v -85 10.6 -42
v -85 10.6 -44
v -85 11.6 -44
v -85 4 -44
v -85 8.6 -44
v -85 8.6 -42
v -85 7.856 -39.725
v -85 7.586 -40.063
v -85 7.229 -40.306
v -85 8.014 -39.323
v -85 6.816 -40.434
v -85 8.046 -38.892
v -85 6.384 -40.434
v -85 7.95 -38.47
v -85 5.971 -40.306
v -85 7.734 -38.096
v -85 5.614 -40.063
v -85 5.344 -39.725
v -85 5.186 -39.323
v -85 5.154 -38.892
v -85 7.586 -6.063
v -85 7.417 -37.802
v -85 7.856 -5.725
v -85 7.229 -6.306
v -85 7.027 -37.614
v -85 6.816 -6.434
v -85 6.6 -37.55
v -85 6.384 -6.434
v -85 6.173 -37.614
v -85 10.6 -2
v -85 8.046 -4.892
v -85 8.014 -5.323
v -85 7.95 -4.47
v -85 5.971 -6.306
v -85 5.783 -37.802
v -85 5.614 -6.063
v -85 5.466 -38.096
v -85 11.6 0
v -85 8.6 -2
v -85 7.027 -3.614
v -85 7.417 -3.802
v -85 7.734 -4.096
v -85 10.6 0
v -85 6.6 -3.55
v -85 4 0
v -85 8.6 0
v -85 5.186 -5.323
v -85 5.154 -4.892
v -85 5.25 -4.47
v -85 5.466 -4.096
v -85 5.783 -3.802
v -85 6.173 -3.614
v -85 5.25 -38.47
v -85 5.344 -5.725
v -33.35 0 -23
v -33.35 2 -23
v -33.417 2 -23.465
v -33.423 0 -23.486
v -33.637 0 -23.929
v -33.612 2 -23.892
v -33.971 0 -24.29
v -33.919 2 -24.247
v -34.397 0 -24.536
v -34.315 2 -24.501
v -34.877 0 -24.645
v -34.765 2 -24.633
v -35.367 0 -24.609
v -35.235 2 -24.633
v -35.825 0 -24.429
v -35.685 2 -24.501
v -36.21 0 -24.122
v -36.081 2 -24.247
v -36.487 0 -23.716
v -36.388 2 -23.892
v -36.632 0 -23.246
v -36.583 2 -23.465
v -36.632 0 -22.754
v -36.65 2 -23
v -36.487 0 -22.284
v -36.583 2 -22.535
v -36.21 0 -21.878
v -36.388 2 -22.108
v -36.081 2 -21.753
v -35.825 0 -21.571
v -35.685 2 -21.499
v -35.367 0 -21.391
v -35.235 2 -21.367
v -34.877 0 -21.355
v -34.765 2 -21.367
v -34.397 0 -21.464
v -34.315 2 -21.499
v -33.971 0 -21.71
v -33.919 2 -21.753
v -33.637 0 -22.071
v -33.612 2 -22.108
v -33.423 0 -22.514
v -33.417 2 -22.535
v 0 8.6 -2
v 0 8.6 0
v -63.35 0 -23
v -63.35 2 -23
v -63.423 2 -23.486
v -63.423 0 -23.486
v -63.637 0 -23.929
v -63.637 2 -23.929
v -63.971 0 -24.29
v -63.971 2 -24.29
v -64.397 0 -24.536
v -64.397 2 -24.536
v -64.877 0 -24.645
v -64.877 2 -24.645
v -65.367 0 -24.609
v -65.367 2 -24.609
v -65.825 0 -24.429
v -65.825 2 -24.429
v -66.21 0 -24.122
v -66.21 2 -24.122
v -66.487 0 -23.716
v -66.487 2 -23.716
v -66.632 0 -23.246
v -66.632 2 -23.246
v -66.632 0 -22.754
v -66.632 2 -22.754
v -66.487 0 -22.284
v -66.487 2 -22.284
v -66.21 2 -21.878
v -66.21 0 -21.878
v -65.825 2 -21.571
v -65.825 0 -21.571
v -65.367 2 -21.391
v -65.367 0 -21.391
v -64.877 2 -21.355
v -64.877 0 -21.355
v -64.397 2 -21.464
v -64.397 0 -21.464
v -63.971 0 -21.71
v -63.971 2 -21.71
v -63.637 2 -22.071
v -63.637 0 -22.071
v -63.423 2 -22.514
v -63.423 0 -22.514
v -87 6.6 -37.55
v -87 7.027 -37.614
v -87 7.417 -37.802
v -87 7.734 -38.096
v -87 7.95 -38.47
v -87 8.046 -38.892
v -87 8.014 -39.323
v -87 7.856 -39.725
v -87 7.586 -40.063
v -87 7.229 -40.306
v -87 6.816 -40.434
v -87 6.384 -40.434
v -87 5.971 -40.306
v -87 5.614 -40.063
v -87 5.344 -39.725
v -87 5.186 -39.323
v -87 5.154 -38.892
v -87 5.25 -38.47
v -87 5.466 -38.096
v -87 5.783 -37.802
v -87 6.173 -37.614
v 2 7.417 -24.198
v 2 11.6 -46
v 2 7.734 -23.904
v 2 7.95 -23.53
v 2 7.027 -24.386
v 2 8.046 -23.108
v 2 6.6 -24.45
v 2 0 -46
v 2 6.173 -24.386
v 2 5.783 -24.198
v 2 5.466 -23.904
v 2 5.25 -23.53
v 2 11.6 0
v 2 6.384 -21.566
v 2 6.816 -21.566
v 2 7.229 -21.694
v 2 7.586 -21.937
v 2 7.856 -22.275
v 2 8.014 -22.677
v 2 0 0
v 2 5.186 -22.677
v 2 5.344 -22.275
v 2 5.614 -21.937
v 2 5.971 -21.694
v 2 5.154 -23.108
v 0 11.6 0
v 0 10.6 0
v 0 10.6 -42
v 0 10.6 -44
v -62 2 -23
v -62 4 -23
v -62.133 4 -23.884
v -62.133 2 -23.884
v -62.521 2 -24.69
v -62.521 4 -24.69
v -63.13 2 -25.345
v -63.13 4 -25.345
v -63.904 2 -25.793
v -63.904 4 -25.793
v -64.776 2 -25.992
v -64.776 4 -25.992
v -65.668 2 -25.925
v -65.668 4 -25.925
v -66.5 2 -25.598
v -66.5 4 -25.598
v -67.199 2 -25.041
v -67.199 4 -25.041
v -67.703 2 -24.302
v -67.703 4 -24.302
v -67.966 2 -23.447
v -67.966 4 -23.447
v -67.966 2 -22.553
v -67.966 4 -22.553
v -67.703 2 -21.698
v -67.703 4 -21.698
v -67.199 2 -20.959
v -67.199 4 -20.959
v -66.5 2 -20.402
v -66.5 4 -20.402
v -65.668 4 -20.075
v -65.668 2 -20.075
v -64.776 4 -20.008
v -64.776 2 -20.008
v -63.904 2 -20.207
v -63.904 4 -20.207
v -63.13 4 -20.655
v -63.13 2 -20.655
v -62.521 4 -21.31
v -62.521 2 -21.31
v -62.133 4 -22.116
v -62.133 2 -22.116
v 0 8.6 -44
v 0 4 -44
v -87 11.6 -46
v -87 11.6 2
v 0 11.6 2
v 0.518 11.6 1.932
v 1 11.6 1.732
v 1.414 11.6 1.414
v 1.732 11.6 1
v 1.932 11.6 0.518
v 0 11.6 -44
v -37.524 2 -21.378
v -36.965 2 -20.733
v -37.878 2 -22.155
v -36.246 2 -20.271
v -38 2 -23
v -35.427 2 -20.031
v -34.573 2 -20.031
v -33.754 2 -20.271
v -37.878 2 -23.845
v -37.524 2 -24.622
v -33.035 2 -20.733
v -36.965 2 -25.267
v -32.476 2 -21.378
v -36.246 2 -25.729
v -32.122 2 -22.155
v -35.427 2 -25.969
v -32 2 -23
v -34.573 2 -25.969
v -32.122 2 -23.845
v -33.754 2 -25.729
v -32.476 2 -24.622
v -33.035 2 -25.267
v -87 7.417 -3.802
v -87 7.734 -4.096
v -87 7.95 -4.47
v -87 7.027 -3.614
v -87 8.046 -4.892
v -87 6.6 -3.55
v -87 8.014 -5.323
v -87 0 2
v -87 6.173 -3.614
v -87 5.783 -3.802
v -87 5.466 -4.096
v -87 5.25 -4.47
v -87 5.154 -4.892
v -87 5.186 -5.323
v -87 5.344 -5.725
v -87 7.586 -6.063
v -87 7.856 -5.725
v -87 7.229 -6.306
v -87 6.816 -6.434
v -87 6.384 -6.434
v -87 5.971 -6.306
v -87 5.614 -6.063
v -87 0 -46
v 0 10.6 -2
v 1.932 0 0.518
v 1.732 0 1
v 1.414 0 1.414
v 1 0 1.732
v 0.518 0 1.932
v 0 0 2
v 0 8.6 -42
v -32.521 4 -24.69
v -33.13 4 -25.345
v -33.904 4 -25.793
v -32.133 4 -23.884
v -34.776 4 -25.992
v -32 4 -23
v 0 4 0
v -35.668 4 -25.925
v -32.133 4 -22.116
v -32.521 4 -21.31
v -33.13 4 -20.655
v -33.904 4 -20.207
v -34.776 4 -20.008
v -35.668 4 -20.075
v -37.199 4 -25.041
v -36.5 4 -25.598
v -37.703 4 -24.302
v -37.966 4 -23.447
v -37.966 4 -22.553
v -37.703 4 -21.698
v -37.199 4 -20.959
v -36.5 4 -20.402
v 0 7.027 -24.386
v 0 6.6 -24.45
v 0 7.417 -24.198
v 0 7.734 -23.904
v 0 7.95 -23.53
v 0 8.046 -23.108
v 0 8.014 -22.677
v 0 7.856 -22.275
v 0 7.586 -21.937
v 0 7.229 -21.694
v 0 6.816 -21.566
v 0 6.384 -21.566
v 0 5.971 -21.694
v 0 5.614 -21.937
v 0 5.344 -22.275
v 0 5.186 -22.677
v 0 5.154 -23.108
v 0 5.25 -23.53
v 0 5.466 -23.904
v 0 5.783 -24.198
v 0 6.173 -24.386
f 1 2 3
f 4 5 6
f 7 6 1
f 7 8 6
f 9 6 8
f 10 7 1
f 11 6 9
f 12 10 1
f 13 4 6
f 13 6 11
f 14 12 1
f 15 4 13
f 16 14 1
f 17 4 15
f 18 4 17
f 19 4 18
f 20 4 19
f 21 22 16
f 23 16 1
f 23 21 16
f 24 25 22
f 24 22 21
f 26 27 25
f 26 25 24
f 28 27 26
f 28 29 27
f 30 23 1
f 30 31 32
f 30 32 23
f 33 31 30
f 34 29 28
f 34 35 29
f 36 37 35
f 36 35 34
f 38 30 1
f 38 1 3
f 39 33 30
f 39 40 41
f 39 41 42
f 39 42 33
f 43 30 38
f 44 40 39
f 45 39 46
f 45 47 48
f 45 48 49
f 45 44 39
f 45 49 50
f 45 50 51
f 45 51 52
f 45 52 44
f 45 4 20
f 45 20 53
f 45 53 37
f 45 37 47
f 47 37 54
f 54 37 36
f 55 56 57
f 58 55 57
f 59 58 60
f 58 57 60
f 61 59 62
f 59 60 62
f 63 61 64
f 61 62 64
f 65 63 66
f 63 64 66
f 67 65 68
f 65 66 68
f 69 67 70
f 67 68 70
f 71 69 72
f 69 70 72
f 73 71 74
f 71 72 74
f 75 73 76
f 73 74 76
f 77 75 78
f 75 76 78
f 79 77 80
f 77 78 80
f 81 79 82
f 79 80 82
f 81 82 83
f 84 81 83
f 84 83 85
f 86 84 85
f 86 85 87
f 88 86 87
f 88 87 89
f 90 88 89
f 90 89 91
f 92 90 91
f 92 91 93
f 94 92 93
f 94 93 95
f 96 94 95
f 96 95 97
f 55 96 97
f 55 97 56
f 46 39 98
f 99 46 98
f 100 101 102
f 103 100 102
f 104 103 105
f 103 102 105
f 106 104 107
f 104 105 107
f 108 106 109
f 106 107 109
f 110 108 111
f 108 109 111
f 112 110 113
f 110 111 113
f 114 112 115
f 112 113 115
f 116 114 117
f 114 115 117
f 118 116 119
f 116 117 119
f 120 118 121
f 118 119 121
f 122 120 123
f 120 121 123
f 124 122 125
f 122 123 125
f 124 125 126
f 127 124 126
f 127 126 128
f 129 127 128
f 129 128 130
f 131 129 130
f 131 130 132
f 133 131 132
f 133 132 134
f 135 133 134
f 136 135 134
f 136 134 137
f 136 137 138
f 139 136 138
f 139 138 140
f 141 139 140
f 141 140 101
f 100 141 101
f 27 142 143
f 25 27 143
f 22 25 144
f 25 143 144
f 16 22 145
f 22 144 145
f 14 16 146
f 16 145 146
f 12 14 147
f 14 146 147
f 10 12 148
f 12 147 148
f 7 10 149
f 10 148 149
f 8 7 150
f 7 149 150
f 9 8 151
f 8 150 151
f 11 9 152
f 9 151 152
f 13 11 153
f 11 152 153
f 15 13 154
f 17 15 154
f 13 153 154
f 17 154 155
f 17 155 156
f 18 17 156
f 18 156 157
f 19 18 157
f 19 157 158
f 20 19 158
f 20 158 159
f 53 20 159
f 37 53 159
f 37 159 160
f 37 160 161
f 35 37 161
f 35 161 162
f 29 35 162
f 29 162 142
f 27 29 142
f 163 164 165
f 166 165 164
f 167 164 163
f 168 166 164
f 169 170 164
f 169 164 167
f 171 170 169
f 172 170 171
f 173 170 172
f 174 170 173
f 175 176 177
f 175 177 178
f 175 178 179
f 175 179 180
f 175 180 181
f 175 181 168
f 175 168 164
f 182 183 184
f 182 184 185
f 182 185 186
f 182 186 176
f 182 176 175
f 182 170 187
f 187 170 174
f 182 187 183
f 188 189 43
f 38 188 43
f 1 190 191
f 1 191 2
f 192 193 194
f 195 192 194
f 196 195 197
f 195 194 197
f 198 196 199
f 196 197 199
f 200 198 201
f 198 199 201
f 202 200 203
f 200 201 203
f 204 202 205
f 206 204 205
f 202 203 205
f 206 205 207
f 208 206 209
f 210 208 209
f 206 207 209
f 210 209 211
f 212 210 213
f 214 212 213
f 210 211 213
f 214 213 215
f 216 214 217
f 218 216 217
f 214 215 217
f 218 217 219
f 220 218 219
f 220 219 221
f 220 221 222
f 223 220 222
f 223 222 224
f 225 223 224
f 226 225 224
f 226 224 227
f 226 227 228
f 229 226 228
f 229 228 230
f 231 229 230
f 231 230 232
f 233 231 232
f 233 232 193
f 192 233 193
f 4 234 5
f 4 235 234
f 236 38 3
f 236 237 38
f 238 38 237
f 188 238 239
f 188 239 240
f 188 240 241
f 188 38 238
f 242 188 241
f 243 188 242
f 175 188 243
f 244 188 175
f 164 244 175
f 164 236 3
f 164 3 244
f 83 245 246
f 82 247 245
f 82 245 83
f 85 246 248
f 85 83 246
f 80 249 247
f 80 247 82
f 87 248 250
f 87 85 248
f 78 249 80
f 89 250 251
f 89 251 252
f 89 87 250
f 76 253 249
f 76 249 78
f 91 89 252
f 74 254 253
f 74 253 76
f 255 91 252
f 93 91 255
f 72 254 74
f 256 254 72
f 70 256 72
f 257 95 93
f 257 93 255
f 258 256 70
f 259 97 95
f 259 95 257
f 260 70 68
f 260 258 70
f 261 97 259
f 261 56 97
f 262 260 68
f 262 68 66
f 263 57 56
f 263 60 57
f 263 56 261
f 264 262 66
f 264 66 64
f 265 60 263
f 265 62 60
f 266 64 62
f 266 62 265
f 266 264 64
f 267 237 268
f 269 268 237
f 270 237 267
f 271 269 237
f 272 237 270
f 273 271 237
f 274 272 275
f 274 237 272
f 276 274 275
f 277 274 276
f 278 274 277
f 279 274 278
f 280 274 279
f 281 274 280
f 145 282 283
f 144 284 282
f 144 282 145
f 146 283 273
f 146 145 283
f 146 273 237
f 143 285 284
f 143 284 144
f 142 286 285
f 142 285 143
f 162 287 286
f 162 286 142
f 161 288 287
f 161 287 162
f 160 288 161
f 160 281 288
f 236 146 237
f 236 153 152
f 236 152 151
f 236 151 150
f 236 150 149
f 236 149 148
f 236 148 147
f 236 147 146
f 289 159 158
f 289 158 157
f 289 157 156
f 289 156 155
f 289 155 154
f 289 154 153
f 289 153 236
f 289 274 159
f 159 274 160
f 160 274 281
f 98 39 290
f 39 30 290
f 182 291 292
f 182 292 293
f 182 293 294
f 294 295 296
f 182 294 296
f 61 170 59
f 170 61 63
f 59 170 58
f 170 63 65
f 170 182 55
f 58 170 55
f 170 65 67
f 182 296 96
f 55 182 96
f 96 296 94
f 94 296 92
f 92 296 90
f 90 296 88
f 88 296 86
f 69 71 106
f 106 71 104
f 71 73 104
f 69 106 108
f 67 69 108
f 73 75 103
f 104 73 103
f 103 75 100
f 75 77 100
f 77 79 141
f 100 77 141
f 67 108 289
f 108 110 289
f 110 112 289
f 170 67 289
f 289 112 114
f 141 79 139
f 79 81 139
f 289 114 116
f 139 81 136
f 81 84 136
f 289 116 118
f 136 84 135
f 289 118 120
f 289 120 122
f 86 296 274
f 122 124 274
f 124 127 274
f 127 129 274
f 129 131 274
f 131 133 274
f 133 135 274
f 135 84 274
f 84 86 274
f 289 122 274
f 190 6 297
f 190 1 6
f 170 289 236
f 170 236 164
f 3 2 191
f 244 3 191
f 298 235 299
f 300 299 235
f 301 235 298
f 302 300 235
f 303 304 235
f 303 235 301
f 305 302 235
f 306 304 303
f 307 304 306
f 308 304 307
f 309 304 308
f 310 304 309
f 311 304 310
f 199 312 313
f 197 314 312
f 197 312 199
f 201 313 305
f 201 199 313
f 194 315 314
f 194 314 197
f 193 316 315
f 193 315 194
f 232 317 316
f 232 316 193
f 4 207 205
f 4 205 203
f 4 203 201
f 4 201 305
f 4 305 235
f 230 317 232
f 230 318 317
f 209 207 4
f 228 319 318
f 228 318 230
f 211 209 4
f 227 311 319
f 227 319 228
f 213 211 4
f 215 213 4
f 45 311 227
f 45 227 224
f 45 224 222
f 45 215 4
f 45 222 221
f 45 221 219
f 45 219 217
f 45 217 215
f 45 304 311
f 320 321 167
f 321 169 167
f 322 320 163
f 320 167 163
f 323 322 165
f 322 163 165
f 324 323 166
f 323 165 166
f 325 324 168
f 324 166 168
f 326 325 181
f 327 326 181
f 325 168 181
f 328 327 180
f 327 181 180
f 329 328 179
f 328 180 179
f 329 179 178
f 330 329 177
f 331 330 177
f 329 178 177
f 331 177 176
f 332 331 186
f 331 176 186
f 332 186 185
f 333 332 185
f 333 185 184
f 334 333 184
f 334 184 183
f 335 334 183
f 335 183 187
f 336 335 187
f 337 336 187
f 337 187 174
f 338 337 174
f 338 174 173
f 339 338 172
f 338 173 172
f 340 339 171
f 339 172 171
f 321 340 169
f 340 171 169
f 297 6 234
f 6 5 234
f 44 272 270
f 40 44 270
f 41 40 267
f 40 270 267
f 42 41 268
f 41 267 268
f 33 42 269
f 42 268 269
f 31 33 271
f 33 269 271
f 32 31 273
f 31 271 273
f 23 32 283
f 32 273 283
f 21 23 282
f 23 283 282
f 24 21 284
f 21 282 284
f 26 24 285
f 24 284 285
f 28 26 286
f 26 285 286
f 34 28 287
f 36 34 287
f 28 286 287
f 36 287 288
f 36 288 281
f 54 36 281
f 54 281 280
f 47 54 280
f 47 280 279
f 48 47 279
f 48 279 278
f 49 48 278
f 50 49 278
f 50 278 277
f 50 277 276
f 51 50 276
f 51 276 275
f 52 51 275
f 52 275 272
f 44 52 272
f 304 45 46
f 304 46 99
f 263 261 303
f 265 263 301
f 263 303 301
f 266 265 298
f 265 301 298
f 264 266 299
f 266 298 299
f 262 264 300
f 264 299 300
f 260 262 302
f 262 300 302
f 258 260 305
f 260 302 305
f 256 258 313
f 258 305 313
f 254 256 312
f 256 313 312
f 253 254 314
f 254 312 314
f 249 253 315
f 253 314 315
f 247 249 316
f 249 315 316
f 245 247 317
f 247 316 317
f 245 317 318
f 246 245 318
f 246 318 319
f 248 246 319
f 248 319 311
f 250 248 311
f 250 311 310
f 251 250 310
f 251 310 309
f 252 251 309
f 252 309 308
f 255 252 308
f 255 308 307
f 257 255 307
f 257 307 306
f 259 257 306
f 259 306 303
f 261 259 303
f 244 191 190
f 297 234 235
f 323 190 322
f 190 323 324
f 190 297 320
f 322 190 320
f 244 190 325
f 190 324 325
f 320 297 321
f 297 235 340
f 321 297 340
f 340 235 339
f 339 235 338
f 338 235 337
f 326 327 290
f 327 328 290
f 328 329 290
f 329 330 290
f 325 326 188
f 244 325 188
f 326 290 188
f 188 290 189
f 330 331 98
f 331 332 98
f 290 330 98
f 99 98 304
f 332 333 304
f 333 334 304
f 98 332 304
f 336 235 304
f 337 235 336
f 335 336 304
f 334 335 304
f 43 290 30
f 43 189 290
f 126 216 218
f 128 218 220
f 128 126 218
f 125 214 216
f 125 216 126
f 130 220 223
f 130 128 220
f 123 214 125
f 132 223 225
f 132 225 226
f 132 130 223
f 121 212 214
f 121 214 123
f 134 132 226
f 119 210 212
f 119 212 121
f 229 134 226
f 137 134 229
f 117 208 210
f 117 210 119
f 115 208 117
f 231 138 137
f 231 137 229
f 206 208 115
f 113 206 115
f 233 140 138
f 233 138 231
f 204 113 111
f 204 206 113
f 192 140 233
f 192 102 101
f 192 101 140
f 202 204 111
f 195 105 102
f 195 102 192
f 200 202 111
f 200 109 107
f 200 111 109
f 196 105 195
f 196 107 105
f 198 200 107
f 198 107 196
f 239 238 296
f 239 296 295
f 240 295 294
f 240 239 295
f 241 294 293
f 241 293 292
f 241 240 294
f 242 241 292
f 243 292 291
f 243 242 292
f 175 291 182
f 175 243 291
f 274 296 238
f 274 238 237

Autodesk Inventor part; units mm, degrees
ref_plane "YZ Plane" through (0, 0, 0) normal (1, 0, 0) x (0, 1, 0)
ref_plane "XZ Plane" through (0, 0, 0) normal (0, 1, 0) x (-1, 0, 0)
ref_plane "XY Plane" through (0, 0, 0) normal (0, 0, 1) x (1, 0, 0)
sketch "Sketch1" plane through (0, 0, 0) normal (0, 1, 0) x (-1, 0, 0)
  line L0 (0, 0) -> (0, -44)
  line L1 (0, -44) -> (85, -44)
  line L2 (85, -44) -> (85, 0)
  line L3 (85, 0) -> (0, 0)
  line L4 (0, 2) -> (85, 2)
  line L5 (85, 2) -> (87, 2)
  line L6 (87, 2) -> (87, -44)
  line L7 (87, -44) -> (87, -46)
  line L8 (87, -46) -> (0, -46)
  line L9 (0, -46) -> (-2, -46)
  line L10 (-2, -46) -> (-2, 2)
  line L11 (-2, 2) -> (0, 2)
  dimension "d0" = 44
  dimension "d1" = 85
  dimension "d2" = 2
  dimension "d3" = 2
  dimension "d4" = 2
  dimension "d5" = 2
extrude "Extrusion1" add sketch "Sketch1" along normal blind 4 contours L3 L2 L1 L0 | L4 L5 L6 L7 L8 L9 L10 L11
extrude "Extrusion2" add sketch "Sketch1" along normal blind 10.6
sketch "Sketch2" plane through (0, 10.6, 0) normal (0, 1, 0) x (1, 0, 0)
  line L0 (-87, -2) -> (-87, 46) projected
  line L1 (-87, -2) -> (-87, 46)
  line L2 (2, 46) -> (2, -2) projected
  line L3 (-87, 46) -> (2, 46)
  line L4 (2, 46) -> (2, -2)
  line L5 (2, -2) -> (-87, -2)
  line L6 (-85, 44) -> (-85, 0) projected
  line L7 (-85, 0) -> (-85, 44)
  line L8 (-85, 44) -> (0, 44)
  line L9 (0, 44) -> (0, 0) projected
  line L10 (0, 44) -> (0, 0)
  line L11 (0, 0) -> (-85, 0)
  line L12 (-85, 0) -> (-85, 2)
  line L13 (-85, 2) -> (0, 2)
  line L14 (-85, 44) -> (-85, 42)
  line L15 (-85, 42) -> (0, 42)
  dimension "d10" = 2
  dimension "d11" = 2
extrude "Extrusion3" add sketch "Sketch2" against normal blind 2 contours L8 L9 L15 L6 | L13 L9 L11 L6
extrude "Extrusion4" add sketch "Sketch2" along normal blind 1
fillet "Fillet1" radius 2 1 edges at (2, 5.8, 2)
sketch "Sketch3" plane through (2, 0, -46) normal (1, 0, 0) x (0, 0, -1)
  line L0 (0, 11.6) -> (-46, 11.6) projected
  line L1 (-23, 11.6) -> (-23, 6.6)
  circle A0 centre (-23, 6.6) radius 1.45
  point P0 (-46, 0)
  dimension "d17" = 5
  dimension "d18" = 2.9
extrude "Extrusion5" cut sketch "Sketch3" against normal blind 15
sketch "Sketch4" plane through (-87, 0, -46) normal (-1, 0, 0) x (0, 0, 1)
  line L0 (46, 11.6) -> (0, 11.6) projected
  line L1 (0, 11.6) -> (2, 11.6)
  line L2 (2, 11.6) -> (7, 11.6)
  line L3 (7, 11.6) -> (7, 6.6)
  line L4 (46, 0) -> (46, 11.6) projected
  line L5 (46, 11.6) -> (41, 11.6)
  line L6 (2, 11.6) -> (46, 11.6) projected
  line L7 (41, 11.6) -> (41, 6.6)
  circle A0 centre (7, 6.6) radius 1.45
  circle A1 centre (41, 6.6) radius 1.45
  dimension "d21" = 2
  dimension "d22" = 5
  dimension "d23" = 5
  dimension "d24" = 5
  dimension "d25" = 5
  dimension "d26" = 2.9
  dimension "d27" = 2.9
extrude "Extrusion6" cut sketch "Sketch4" against normal blind 15
sketch "Sketch5" plane through (0, 4, 0) normal (0, 1, 0) x (1, 0, 0)
  line L0 (-87, 46) -> (-87, 0) projected
  line L1 (-87, 23) -> (-65, 23)
  line L2 (-65, 23) -> (-35, 23)
  circle A0 centre (-65, 23) radius 1.65
  circle A1 centre (-35, 23) radius 1.65
  circle A2 centre (-35, 23) radius 3
  circle A3 centre (-65, 23) radius 3
  point P0 (0, 0)
  dimension "d30" = 22
  dimension "d31" = 30
  dimension "d32" = 3.3
  dimension "d33" = 3.3
  dimension "d34" = 6
  dimension "d35" = 6
extrude "Extrusion7" cut sketch "Sketch5" against normal blind 10 contours A1 | A0 L2 L1 | L1 L2 A0
extrude "Extrusion8" cut sketch "Sketch5" against normal blind 2 contours A3 L2 A0 L1 | A2 | L1 A0 L2 A3
properties part number "output"
